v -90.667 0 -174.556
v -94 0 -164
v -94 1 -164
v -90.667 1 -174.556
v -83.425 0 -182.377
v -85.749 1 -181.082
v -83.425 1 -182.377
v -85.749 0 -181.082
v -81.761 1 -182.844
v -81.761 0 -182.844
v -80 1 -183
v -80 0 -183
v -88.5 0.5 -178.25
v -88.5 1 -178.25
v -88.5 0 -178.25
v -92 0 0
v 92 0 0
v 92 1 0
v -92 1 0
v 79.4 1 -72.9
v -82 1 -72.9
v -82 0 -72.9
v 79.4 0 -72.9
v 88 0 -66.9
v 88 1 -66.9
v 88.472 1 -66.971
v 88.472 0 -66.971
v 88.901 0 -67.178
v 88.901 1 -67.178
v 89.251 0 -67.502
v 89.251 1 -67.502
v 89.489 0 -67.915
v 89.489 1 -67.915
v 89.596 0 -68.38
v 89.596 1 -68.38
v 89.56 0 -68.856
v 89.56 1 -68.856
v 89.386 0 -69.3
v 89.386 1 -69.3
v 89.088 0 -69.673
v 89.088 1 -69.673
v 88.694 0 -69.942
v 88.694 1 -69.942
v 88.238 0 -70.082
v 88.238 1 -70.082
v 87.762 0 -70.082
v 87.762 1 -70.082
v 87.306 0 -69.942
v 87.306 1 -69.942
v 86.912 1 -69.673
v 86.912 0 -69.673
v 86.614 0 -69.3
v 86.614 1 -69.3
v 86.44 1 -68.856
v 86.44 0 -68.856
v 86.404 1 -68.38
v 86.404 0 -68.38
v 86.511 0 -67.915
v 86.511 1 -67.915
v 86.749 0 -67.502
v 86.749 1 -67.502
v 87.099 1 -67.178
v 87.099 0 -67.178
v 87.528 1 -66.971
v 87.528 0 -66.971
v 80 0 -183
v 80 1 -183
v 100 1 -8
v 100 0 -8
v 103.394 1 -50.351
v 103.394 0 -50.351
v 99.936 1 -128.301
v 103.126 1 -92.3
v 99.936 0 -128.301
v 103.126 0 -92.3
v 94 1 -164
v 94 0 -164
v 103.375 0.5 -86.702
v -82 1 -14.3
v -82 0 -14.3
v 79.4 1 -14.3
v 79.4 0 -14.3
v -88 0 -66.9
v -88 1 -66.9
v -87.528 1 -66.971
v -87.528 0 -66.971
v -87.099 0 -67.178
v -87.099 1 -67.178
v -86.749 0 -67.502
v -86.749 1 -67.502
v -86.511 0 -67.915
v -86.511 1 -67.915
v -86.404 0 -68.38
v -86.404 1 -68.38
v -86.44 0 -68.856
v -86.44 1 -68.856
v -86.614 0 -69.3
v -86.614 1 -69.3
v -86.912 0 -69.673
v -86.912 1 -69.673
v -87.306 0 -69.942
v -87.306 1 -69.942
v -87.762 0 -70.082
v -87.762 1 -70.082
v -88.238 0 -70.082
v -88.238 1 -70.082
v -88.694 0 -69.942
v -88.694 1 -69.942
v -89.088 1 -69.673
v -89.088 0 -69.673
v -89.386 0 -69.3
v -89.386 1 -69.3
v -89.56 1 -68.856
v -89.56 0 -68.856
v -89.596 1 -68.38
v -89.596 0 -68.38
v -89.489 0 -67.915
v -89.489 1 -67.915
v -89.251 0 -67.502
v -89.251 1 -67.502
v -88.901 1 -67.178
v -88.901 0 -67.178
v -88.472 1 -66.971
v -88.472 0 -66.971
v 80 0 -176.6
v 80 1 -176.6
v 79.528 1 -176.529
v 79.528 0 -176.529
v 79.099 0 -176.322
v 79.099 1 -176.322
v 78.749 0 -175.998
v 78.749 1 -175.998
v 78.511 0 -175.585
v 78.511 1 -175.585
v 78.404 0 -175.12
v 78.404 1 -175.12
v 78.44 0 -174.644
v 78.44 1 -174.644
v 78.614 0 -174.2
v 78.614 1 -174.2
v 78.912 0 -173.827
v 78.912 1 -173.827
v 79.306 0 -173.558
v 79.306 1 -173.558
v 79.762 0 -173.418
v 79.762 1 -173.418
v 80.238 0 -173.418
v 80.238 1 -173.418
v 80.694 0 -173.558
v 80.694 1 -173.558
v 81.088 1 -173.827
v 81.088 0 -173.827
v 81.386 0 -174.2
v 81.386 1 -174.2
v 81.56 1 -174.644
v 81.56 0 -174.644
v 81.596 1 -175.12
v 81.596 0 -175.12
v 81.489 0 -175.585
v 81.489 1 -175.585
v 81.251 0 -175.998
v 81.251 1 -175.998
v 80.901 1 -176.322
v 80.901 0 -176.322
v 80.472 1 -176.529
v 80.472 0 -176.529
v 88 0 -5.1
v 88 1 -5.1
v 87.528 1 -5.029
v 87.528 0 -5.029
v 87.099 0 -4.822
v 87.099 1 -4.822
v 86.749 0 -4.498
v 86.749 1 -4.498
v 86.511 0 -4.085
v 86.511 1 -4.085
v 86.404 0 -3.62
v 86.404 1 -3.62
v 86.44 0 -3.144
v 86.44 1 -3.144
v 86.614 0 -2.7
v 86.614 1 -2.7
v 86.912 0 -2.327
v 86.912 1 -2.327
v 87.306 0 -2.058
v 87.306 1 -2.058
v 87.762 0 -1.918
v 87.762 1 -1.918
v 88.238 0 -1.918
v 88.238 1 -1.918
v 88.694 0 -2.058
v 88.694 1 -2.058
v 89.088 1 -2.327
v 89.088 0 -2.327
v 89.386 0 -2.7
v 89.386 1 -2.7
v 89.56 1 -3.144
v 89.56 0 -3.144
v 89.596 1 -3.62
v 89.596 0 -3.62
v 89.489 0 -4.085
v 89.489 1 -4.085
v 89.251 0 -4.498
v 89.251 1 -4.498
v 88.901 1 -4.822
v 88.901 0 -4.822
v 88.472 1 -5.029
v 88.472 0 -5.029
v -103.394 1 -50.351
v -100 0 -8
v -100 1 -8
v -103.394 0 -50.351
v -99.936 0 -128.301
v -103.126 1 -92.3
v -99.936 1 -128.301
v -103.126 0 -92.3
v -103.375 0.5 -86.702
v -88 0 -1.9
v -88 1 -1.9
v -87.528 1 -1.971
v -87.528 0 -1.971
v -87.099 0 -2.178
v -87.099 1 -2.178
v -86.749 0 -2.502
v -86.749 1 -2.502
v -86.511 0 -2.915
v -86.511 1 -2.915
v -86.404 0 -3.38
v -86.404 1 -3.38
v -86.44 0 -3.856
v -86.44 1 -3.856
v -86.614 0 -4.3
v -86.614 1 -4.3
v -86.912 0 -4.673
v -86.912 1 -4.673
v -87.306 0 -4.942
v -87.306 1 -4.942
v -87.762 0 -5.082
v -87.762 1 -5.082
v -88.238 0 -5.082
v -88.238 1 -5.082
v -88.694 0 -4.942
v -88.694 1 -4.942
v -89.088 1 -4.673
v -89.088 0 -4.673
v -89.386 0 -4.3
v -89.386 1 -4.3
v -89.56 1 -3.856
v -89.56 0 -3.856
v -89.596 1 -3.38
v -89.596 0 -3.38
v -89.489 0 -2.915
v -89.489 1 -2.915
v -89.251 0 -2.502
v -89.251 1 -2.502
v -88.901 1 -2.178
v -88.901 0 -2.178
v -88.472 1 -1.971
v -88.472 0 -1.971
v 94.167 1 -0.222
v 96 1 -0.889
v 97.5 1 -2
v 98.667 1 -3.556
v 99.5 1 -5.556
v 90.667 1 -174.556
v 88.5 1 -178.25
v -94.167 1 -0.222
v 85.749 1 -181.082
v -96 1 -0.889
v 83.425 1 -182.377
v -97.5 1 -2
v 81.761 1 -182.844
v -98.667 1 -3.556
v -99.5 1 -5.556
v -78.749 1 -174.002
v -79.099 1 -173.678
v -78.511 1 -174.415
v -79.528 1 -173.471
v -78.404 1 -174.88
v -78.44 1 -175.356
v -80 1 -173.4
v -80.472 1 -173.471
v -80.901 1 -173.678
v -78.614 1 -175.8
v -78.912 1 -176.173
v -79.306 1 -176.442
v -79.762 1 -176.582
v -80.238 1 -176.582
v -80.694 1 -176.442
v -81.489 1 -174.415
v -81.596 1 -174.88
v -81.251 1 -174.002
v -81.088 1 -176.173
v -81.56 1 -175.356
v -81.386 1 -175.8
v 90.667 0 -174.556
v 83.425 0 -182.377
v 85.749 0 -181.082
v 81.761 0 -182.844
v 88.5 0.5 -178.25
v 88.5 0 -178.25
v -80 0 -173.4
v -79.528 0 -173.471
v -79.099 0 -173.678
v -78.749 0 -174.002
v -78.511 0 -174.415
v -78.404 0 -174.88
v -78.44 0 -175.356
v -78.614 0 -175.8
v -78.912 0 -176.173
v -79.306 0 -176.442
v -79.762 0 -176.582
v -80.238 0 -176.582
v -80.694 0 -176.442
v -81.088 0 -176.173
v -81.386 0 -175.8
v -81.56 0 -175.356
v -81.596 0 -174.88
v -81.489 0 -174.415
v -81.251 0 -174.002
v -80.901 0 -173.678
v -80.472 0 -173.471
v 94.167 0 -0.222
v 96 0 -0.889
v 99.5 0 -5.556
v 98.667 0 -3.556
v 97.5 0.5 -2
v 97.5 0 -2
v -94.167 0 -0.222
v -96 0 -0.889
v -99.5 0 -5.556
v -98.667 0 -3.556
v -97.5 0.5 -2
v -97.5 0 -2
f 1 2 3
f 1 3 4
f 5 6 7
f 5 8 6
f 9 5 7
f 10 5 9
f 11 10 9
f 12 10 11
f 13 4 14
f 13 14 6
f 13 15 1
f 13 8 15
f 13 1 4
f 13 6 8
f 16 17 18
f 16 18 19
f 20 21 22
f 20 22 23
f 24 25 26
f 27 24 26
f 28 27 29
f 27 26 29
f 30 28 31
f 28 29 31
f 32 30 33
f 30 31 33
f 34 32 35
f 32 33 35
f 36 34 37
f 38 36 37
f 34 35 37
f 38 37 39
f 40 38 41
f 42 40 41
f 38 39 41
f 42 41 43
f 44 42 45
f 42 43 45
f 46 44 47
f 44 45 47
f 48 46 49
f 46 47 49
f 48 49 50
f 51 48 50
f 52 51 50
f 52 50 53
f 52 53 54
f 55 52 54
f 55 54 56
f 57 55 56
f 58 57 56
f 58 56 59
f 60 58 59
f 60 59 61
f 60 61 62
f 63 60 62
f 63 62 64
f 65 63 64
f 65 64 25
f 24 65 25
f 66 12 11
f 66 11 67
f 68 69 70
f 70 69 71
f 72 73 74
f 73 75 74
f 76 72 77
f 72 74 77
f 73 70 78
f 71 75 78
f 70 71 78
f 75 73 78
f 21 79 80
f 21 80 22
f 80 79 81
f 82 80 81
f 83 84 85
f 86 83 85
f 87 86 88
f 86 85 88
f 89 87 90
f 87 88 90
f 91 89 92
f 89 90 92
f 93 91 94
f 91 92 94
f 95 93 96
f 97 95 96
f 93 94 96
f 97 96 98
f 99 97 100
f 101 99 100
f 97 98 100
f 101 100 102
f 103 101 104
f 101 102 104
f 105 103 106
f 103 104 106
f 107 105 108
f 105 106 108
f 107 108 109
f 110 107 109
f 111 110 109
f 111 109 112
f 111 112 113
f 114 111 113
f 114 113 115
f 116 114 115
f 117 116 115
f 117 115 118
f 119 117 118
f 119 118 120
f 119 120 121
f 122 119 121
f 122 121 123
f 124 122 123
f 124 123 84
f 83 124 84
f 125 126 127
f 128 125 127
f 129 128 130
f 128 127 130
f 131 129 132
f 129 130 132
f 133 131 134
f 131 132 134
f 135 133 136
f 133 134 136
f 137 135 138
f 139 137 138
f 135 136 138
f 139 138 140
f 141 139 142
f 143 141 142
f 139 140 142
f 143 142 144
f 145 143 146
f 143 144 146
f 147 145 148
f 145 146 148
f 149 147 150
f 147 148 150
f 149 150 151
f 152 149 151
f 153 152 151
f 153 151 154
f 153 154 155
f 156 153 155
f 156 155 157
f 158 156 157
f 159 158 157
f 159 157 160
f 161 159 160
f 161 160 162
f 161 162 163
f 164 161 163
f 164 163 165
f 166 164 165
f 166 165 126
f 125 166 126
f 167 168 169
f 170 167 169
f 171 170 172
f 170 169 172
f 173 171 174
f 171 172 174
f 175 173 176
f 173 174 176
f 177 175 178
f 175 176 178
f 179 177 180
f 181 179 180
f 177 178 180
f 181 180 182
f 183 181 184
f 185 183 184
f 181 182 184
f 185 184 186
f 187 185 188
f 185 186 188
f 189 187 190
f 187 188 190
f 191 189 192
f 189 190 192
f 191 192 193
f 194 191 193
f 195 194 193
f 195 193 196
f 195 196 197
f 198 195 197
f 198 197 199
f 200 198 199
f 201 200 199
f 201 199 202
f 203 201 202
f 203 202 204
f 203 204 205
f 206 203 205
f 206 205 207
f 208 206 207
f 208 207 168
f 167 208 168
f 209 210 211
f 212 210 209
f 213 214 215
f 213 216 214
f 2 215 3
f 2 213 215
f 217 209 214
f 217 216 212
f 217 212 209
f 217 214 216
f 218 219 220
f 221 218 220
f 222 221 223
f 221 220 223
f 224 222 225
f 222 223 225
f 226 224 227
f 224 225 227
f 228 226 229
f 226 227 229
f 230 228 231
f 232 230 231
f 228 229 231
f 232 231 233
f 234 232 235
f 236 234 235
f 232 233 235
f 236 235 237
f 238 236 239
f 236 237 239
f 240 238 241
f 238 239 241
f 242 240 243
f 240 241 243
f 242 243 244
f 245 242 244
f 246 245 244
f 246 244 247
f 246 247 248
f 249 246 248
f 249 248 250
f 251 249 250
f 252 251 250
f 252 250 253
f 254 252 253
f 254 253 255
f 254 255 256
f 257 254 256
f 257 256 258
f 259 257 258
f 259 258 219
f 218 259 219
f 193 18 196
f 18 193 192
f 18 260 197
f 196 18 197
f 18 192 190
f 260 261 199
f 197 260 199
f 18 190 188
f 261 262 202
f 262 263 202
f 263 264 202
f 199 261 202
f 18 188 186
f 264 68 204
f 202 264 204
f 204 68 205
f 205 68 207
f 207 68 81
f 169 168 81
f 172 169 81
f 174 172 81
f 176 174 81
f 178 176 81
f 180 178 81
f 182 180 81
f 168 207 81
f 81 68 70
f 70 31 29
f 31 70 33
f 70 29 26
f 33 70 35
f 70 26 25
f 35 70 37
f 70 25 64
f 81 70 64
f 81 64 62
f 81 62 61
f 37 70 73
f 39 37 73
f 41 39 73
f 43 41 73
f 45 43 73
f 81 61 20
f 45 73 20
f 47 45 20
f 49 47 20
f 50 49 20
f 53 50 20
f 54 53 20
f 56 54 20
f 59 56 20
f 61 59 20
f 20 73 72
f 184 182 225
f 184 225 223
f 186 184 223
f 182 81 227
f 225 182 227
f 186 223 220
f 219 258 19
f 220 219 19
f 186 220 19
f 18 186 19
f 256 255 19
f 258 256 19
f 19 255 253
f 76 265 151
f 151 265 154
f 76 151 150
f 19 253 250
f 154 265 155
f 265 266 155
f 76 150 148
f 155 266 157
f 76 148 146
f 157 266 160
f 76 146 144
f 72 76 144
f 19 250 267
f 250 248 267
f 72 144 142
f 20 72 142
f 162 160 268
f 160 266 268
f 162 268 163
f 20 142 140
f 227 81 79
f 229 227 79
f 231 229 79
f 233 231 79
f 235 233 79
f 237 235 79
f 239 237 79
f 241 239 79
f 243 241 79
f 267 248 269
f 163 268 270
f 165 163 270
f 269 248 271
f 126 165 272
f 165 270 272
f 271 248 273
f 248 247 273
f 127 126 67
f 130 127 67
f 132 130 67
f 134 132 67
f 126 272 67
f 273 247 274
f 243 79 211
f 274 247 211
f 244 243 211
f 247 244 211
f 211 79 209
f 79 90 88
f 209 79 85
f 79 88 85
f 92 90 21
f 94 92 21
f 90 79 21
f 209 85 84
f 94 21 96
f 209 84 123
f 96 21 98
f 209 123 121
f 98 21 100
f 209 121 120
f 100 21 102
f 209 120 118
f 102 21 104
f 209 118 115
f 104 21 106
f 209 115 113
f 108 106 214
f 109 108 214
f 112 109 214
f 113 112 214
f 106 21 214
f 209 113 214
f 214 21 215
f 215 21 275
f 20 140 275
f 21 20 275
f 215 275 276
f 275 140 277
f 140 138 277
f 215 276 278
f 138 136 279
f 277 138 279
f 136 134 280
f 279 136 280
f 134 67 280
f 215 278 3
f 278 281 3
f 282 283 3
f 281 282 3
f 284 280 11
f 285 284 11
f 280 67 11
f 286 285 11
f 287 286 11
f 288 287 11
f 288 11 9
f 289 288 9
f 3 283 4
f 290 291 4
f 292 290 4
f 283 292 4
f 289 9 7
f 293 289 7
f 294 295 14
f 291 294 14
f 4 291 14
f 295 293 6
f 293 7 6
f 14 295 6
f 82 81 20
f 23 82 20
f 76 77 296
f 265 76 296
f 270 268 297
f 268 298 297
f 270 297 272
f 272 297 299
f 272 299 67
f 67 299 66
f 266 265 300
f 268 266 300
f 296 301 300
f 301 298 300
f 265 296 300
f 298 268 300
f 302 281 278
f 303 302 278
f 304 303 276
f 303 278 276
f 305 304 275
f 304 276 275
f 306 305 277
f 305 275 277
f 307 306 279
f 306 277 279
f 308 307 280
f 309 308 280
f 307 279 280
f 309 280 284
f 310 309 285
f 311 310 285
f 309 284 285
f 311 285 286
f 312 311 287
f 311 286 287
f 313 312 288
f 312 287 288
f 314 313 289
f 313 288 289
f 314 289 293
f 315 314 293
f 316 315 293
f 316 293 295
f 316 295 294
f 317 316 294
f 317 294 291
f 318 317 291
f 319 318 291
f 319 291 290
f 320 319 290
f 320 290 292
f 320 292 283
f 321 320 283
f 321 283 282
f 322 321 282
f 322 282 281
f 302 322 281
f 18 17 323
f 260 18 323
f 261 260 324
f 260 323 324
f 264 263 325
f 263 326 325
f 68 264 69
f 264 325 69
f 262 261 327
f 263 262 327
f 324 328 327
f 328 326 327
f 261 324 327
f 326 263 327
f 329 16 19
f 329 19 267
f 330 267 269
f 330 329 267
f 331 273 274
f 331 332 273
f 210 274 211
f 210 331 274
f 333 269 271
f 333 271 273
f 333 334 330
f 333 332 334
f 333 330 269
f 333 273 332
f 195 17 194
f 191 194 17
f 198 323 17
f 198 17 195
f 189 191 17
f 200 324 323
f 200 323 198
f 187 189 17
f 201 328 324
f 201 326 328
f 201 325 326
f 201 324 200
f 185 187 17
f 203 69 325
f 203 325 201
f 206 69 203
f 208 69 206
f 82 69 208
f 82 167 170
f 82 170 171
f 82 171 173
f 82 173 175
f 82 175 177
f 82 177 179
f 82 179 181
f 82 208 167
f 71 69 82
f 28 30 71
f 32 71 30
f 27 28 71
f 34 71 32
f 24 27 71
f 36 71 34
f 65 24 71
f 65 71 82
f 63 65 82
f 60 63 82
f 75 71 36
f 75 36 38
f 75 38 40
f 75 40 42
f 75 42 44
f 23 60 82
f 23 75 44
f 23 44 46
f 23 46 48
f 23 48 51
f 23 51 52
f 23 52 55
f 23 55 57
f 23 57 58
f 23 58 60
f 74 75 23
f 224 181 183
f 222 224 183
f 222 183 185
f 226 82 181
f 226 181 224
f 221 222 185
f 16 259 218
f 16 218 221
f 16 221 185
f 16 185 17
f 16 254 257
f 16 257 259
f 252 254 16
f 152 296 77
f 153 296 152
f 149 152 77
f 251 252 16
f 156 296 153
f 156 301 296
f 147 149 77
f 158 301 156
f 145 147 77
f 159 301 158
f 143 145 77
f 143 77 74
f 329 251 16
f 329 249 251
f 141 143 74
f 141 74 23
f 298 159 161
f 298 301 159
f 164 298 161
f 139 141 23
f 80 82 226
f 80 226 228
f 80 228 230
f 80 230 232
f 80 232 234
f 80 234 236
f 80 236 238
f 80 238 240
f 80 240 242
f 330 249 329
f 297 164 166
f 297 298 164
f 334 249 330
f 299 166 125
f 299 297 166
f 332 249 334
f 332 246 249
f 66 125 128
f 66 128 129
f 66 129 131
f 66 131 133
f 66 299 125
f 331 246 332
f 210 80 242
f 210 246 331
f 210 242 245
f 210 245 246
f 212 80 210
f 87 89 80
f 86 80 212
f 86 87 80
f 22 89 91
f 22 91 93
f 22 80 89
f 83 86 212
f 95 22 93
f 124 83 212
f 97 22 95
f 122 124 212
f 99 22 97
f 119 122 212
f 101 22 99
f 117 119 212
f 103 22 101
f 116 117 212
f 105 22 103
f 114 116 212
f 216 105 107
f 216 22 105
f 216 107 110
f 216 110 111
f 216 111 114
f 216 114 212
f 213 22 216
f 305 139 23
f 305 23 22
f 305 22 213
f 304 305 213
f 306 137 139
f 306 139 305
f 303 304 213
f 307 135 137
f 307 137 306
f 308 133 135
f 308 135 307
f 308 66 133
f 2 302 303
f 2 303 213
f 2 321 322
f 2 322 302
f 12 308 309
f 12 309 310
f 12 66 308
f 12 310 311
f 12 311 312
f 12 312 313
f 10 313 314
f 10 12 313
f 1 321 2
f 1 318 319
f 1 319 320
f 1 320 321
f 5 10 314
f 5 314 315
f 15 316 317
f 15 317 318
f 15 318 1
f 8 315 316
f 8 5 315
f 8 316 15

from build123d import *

# Parameters (mm, degrees)
BOSS_EXTRUDE1_DEPTH = 1
SKETCH2_R           = 1.6
SKETCH2_W           = 161.4
SKETCH2_H           = 58.6
CUT_EXTRUDE1_DEPTH  = 211.355512163


with BuildPart() as part:
    # Sketch1 → Boss-Extrude1 (new body)
    with BuildSketch(Plane(origin=(0, 0, 0), x_dir=(1, 0, 0), z_dir=(0, 1, 0))):
        with BuildLine():
            Line((92, 0), (-92, 0))
            add(Edge.make_bspline(
                [(-92, 0), (-99, 0), (-100, 8)],
                knots=[0, 0, 0, 1, 1, 1], degree=2))
            add(Edge.make_bspline(
                [(-100, 8), (-109.749547472, 87.403692131), (-94, 164)],
                knots=[0, 0, 0, 1, 1, 1], degree=2))
            add(Edge.make_bspline(
                [(-94, 164), (-90, 183), (-80, 183)],
                knots=[0, 0, 0, 1, 1, 1], degree=2))
            Line((-80, 183), (80, 183))
            add(Edge.make_bspline(
                [(94, 164), (90, 183), (80, 183)],
                knots=[0, 0, 0, 1, 1, 1], degree=2))
            add(Edge.make_bspline(
                [(100, 8), (109.749547472, 87.403692131), (94, 164)],
                knots=[0, 0, 0, 1, 1, 1], degree=2))
            add(Edge.make_bspline(
                [(92, 0), (99, 0), (100, 8)],
                knots=[0, 0, 0, 1, 1, 1], degree=2))
        make_face()
    extrude(amount=BOSS_EXTRUDE1_DEPTH)

    # Sketch2 → Cut-Extrude1 (cut, through all)
    with BuildSketch(Plane(origin=(0, 1, 0), x_dir=(1, 0, 0), z_dir=(0, 1, 0))):
        with Locations(Location((-88, 3.5, 0), (0, 0, 270))):
            Circle(SKETCH2_R)
        with Locations(Location((88, 3.5, 0), (0, 0, 90))):
            Circle(SKETCH2_R)
        with Locations(Location((-80, 175, 0), (0, 0, 270))):
            Circle(SKETCH2_R)
        with Locations(Location((80, 175, 0), (0, 0, 90))):
            Circle(SKETCH2_R)
        with Locations(Location((-88, 68.5, 0), (0, 0, 270))):
            Circle(SKETCH2_R)
        with Locations(Location((88, 68.5, 0), (0, 0, 270))):
            Circle(SKETCH2_R)
        with Locations((-1.3, 43.6)):
            Rectangle(SKETCH2_W, SKETCH2_H)
    extrude(amount=-CUT_EXTRUDE1_DEPTH, mode=Mode.SUBTRACT)


solid = part.part
